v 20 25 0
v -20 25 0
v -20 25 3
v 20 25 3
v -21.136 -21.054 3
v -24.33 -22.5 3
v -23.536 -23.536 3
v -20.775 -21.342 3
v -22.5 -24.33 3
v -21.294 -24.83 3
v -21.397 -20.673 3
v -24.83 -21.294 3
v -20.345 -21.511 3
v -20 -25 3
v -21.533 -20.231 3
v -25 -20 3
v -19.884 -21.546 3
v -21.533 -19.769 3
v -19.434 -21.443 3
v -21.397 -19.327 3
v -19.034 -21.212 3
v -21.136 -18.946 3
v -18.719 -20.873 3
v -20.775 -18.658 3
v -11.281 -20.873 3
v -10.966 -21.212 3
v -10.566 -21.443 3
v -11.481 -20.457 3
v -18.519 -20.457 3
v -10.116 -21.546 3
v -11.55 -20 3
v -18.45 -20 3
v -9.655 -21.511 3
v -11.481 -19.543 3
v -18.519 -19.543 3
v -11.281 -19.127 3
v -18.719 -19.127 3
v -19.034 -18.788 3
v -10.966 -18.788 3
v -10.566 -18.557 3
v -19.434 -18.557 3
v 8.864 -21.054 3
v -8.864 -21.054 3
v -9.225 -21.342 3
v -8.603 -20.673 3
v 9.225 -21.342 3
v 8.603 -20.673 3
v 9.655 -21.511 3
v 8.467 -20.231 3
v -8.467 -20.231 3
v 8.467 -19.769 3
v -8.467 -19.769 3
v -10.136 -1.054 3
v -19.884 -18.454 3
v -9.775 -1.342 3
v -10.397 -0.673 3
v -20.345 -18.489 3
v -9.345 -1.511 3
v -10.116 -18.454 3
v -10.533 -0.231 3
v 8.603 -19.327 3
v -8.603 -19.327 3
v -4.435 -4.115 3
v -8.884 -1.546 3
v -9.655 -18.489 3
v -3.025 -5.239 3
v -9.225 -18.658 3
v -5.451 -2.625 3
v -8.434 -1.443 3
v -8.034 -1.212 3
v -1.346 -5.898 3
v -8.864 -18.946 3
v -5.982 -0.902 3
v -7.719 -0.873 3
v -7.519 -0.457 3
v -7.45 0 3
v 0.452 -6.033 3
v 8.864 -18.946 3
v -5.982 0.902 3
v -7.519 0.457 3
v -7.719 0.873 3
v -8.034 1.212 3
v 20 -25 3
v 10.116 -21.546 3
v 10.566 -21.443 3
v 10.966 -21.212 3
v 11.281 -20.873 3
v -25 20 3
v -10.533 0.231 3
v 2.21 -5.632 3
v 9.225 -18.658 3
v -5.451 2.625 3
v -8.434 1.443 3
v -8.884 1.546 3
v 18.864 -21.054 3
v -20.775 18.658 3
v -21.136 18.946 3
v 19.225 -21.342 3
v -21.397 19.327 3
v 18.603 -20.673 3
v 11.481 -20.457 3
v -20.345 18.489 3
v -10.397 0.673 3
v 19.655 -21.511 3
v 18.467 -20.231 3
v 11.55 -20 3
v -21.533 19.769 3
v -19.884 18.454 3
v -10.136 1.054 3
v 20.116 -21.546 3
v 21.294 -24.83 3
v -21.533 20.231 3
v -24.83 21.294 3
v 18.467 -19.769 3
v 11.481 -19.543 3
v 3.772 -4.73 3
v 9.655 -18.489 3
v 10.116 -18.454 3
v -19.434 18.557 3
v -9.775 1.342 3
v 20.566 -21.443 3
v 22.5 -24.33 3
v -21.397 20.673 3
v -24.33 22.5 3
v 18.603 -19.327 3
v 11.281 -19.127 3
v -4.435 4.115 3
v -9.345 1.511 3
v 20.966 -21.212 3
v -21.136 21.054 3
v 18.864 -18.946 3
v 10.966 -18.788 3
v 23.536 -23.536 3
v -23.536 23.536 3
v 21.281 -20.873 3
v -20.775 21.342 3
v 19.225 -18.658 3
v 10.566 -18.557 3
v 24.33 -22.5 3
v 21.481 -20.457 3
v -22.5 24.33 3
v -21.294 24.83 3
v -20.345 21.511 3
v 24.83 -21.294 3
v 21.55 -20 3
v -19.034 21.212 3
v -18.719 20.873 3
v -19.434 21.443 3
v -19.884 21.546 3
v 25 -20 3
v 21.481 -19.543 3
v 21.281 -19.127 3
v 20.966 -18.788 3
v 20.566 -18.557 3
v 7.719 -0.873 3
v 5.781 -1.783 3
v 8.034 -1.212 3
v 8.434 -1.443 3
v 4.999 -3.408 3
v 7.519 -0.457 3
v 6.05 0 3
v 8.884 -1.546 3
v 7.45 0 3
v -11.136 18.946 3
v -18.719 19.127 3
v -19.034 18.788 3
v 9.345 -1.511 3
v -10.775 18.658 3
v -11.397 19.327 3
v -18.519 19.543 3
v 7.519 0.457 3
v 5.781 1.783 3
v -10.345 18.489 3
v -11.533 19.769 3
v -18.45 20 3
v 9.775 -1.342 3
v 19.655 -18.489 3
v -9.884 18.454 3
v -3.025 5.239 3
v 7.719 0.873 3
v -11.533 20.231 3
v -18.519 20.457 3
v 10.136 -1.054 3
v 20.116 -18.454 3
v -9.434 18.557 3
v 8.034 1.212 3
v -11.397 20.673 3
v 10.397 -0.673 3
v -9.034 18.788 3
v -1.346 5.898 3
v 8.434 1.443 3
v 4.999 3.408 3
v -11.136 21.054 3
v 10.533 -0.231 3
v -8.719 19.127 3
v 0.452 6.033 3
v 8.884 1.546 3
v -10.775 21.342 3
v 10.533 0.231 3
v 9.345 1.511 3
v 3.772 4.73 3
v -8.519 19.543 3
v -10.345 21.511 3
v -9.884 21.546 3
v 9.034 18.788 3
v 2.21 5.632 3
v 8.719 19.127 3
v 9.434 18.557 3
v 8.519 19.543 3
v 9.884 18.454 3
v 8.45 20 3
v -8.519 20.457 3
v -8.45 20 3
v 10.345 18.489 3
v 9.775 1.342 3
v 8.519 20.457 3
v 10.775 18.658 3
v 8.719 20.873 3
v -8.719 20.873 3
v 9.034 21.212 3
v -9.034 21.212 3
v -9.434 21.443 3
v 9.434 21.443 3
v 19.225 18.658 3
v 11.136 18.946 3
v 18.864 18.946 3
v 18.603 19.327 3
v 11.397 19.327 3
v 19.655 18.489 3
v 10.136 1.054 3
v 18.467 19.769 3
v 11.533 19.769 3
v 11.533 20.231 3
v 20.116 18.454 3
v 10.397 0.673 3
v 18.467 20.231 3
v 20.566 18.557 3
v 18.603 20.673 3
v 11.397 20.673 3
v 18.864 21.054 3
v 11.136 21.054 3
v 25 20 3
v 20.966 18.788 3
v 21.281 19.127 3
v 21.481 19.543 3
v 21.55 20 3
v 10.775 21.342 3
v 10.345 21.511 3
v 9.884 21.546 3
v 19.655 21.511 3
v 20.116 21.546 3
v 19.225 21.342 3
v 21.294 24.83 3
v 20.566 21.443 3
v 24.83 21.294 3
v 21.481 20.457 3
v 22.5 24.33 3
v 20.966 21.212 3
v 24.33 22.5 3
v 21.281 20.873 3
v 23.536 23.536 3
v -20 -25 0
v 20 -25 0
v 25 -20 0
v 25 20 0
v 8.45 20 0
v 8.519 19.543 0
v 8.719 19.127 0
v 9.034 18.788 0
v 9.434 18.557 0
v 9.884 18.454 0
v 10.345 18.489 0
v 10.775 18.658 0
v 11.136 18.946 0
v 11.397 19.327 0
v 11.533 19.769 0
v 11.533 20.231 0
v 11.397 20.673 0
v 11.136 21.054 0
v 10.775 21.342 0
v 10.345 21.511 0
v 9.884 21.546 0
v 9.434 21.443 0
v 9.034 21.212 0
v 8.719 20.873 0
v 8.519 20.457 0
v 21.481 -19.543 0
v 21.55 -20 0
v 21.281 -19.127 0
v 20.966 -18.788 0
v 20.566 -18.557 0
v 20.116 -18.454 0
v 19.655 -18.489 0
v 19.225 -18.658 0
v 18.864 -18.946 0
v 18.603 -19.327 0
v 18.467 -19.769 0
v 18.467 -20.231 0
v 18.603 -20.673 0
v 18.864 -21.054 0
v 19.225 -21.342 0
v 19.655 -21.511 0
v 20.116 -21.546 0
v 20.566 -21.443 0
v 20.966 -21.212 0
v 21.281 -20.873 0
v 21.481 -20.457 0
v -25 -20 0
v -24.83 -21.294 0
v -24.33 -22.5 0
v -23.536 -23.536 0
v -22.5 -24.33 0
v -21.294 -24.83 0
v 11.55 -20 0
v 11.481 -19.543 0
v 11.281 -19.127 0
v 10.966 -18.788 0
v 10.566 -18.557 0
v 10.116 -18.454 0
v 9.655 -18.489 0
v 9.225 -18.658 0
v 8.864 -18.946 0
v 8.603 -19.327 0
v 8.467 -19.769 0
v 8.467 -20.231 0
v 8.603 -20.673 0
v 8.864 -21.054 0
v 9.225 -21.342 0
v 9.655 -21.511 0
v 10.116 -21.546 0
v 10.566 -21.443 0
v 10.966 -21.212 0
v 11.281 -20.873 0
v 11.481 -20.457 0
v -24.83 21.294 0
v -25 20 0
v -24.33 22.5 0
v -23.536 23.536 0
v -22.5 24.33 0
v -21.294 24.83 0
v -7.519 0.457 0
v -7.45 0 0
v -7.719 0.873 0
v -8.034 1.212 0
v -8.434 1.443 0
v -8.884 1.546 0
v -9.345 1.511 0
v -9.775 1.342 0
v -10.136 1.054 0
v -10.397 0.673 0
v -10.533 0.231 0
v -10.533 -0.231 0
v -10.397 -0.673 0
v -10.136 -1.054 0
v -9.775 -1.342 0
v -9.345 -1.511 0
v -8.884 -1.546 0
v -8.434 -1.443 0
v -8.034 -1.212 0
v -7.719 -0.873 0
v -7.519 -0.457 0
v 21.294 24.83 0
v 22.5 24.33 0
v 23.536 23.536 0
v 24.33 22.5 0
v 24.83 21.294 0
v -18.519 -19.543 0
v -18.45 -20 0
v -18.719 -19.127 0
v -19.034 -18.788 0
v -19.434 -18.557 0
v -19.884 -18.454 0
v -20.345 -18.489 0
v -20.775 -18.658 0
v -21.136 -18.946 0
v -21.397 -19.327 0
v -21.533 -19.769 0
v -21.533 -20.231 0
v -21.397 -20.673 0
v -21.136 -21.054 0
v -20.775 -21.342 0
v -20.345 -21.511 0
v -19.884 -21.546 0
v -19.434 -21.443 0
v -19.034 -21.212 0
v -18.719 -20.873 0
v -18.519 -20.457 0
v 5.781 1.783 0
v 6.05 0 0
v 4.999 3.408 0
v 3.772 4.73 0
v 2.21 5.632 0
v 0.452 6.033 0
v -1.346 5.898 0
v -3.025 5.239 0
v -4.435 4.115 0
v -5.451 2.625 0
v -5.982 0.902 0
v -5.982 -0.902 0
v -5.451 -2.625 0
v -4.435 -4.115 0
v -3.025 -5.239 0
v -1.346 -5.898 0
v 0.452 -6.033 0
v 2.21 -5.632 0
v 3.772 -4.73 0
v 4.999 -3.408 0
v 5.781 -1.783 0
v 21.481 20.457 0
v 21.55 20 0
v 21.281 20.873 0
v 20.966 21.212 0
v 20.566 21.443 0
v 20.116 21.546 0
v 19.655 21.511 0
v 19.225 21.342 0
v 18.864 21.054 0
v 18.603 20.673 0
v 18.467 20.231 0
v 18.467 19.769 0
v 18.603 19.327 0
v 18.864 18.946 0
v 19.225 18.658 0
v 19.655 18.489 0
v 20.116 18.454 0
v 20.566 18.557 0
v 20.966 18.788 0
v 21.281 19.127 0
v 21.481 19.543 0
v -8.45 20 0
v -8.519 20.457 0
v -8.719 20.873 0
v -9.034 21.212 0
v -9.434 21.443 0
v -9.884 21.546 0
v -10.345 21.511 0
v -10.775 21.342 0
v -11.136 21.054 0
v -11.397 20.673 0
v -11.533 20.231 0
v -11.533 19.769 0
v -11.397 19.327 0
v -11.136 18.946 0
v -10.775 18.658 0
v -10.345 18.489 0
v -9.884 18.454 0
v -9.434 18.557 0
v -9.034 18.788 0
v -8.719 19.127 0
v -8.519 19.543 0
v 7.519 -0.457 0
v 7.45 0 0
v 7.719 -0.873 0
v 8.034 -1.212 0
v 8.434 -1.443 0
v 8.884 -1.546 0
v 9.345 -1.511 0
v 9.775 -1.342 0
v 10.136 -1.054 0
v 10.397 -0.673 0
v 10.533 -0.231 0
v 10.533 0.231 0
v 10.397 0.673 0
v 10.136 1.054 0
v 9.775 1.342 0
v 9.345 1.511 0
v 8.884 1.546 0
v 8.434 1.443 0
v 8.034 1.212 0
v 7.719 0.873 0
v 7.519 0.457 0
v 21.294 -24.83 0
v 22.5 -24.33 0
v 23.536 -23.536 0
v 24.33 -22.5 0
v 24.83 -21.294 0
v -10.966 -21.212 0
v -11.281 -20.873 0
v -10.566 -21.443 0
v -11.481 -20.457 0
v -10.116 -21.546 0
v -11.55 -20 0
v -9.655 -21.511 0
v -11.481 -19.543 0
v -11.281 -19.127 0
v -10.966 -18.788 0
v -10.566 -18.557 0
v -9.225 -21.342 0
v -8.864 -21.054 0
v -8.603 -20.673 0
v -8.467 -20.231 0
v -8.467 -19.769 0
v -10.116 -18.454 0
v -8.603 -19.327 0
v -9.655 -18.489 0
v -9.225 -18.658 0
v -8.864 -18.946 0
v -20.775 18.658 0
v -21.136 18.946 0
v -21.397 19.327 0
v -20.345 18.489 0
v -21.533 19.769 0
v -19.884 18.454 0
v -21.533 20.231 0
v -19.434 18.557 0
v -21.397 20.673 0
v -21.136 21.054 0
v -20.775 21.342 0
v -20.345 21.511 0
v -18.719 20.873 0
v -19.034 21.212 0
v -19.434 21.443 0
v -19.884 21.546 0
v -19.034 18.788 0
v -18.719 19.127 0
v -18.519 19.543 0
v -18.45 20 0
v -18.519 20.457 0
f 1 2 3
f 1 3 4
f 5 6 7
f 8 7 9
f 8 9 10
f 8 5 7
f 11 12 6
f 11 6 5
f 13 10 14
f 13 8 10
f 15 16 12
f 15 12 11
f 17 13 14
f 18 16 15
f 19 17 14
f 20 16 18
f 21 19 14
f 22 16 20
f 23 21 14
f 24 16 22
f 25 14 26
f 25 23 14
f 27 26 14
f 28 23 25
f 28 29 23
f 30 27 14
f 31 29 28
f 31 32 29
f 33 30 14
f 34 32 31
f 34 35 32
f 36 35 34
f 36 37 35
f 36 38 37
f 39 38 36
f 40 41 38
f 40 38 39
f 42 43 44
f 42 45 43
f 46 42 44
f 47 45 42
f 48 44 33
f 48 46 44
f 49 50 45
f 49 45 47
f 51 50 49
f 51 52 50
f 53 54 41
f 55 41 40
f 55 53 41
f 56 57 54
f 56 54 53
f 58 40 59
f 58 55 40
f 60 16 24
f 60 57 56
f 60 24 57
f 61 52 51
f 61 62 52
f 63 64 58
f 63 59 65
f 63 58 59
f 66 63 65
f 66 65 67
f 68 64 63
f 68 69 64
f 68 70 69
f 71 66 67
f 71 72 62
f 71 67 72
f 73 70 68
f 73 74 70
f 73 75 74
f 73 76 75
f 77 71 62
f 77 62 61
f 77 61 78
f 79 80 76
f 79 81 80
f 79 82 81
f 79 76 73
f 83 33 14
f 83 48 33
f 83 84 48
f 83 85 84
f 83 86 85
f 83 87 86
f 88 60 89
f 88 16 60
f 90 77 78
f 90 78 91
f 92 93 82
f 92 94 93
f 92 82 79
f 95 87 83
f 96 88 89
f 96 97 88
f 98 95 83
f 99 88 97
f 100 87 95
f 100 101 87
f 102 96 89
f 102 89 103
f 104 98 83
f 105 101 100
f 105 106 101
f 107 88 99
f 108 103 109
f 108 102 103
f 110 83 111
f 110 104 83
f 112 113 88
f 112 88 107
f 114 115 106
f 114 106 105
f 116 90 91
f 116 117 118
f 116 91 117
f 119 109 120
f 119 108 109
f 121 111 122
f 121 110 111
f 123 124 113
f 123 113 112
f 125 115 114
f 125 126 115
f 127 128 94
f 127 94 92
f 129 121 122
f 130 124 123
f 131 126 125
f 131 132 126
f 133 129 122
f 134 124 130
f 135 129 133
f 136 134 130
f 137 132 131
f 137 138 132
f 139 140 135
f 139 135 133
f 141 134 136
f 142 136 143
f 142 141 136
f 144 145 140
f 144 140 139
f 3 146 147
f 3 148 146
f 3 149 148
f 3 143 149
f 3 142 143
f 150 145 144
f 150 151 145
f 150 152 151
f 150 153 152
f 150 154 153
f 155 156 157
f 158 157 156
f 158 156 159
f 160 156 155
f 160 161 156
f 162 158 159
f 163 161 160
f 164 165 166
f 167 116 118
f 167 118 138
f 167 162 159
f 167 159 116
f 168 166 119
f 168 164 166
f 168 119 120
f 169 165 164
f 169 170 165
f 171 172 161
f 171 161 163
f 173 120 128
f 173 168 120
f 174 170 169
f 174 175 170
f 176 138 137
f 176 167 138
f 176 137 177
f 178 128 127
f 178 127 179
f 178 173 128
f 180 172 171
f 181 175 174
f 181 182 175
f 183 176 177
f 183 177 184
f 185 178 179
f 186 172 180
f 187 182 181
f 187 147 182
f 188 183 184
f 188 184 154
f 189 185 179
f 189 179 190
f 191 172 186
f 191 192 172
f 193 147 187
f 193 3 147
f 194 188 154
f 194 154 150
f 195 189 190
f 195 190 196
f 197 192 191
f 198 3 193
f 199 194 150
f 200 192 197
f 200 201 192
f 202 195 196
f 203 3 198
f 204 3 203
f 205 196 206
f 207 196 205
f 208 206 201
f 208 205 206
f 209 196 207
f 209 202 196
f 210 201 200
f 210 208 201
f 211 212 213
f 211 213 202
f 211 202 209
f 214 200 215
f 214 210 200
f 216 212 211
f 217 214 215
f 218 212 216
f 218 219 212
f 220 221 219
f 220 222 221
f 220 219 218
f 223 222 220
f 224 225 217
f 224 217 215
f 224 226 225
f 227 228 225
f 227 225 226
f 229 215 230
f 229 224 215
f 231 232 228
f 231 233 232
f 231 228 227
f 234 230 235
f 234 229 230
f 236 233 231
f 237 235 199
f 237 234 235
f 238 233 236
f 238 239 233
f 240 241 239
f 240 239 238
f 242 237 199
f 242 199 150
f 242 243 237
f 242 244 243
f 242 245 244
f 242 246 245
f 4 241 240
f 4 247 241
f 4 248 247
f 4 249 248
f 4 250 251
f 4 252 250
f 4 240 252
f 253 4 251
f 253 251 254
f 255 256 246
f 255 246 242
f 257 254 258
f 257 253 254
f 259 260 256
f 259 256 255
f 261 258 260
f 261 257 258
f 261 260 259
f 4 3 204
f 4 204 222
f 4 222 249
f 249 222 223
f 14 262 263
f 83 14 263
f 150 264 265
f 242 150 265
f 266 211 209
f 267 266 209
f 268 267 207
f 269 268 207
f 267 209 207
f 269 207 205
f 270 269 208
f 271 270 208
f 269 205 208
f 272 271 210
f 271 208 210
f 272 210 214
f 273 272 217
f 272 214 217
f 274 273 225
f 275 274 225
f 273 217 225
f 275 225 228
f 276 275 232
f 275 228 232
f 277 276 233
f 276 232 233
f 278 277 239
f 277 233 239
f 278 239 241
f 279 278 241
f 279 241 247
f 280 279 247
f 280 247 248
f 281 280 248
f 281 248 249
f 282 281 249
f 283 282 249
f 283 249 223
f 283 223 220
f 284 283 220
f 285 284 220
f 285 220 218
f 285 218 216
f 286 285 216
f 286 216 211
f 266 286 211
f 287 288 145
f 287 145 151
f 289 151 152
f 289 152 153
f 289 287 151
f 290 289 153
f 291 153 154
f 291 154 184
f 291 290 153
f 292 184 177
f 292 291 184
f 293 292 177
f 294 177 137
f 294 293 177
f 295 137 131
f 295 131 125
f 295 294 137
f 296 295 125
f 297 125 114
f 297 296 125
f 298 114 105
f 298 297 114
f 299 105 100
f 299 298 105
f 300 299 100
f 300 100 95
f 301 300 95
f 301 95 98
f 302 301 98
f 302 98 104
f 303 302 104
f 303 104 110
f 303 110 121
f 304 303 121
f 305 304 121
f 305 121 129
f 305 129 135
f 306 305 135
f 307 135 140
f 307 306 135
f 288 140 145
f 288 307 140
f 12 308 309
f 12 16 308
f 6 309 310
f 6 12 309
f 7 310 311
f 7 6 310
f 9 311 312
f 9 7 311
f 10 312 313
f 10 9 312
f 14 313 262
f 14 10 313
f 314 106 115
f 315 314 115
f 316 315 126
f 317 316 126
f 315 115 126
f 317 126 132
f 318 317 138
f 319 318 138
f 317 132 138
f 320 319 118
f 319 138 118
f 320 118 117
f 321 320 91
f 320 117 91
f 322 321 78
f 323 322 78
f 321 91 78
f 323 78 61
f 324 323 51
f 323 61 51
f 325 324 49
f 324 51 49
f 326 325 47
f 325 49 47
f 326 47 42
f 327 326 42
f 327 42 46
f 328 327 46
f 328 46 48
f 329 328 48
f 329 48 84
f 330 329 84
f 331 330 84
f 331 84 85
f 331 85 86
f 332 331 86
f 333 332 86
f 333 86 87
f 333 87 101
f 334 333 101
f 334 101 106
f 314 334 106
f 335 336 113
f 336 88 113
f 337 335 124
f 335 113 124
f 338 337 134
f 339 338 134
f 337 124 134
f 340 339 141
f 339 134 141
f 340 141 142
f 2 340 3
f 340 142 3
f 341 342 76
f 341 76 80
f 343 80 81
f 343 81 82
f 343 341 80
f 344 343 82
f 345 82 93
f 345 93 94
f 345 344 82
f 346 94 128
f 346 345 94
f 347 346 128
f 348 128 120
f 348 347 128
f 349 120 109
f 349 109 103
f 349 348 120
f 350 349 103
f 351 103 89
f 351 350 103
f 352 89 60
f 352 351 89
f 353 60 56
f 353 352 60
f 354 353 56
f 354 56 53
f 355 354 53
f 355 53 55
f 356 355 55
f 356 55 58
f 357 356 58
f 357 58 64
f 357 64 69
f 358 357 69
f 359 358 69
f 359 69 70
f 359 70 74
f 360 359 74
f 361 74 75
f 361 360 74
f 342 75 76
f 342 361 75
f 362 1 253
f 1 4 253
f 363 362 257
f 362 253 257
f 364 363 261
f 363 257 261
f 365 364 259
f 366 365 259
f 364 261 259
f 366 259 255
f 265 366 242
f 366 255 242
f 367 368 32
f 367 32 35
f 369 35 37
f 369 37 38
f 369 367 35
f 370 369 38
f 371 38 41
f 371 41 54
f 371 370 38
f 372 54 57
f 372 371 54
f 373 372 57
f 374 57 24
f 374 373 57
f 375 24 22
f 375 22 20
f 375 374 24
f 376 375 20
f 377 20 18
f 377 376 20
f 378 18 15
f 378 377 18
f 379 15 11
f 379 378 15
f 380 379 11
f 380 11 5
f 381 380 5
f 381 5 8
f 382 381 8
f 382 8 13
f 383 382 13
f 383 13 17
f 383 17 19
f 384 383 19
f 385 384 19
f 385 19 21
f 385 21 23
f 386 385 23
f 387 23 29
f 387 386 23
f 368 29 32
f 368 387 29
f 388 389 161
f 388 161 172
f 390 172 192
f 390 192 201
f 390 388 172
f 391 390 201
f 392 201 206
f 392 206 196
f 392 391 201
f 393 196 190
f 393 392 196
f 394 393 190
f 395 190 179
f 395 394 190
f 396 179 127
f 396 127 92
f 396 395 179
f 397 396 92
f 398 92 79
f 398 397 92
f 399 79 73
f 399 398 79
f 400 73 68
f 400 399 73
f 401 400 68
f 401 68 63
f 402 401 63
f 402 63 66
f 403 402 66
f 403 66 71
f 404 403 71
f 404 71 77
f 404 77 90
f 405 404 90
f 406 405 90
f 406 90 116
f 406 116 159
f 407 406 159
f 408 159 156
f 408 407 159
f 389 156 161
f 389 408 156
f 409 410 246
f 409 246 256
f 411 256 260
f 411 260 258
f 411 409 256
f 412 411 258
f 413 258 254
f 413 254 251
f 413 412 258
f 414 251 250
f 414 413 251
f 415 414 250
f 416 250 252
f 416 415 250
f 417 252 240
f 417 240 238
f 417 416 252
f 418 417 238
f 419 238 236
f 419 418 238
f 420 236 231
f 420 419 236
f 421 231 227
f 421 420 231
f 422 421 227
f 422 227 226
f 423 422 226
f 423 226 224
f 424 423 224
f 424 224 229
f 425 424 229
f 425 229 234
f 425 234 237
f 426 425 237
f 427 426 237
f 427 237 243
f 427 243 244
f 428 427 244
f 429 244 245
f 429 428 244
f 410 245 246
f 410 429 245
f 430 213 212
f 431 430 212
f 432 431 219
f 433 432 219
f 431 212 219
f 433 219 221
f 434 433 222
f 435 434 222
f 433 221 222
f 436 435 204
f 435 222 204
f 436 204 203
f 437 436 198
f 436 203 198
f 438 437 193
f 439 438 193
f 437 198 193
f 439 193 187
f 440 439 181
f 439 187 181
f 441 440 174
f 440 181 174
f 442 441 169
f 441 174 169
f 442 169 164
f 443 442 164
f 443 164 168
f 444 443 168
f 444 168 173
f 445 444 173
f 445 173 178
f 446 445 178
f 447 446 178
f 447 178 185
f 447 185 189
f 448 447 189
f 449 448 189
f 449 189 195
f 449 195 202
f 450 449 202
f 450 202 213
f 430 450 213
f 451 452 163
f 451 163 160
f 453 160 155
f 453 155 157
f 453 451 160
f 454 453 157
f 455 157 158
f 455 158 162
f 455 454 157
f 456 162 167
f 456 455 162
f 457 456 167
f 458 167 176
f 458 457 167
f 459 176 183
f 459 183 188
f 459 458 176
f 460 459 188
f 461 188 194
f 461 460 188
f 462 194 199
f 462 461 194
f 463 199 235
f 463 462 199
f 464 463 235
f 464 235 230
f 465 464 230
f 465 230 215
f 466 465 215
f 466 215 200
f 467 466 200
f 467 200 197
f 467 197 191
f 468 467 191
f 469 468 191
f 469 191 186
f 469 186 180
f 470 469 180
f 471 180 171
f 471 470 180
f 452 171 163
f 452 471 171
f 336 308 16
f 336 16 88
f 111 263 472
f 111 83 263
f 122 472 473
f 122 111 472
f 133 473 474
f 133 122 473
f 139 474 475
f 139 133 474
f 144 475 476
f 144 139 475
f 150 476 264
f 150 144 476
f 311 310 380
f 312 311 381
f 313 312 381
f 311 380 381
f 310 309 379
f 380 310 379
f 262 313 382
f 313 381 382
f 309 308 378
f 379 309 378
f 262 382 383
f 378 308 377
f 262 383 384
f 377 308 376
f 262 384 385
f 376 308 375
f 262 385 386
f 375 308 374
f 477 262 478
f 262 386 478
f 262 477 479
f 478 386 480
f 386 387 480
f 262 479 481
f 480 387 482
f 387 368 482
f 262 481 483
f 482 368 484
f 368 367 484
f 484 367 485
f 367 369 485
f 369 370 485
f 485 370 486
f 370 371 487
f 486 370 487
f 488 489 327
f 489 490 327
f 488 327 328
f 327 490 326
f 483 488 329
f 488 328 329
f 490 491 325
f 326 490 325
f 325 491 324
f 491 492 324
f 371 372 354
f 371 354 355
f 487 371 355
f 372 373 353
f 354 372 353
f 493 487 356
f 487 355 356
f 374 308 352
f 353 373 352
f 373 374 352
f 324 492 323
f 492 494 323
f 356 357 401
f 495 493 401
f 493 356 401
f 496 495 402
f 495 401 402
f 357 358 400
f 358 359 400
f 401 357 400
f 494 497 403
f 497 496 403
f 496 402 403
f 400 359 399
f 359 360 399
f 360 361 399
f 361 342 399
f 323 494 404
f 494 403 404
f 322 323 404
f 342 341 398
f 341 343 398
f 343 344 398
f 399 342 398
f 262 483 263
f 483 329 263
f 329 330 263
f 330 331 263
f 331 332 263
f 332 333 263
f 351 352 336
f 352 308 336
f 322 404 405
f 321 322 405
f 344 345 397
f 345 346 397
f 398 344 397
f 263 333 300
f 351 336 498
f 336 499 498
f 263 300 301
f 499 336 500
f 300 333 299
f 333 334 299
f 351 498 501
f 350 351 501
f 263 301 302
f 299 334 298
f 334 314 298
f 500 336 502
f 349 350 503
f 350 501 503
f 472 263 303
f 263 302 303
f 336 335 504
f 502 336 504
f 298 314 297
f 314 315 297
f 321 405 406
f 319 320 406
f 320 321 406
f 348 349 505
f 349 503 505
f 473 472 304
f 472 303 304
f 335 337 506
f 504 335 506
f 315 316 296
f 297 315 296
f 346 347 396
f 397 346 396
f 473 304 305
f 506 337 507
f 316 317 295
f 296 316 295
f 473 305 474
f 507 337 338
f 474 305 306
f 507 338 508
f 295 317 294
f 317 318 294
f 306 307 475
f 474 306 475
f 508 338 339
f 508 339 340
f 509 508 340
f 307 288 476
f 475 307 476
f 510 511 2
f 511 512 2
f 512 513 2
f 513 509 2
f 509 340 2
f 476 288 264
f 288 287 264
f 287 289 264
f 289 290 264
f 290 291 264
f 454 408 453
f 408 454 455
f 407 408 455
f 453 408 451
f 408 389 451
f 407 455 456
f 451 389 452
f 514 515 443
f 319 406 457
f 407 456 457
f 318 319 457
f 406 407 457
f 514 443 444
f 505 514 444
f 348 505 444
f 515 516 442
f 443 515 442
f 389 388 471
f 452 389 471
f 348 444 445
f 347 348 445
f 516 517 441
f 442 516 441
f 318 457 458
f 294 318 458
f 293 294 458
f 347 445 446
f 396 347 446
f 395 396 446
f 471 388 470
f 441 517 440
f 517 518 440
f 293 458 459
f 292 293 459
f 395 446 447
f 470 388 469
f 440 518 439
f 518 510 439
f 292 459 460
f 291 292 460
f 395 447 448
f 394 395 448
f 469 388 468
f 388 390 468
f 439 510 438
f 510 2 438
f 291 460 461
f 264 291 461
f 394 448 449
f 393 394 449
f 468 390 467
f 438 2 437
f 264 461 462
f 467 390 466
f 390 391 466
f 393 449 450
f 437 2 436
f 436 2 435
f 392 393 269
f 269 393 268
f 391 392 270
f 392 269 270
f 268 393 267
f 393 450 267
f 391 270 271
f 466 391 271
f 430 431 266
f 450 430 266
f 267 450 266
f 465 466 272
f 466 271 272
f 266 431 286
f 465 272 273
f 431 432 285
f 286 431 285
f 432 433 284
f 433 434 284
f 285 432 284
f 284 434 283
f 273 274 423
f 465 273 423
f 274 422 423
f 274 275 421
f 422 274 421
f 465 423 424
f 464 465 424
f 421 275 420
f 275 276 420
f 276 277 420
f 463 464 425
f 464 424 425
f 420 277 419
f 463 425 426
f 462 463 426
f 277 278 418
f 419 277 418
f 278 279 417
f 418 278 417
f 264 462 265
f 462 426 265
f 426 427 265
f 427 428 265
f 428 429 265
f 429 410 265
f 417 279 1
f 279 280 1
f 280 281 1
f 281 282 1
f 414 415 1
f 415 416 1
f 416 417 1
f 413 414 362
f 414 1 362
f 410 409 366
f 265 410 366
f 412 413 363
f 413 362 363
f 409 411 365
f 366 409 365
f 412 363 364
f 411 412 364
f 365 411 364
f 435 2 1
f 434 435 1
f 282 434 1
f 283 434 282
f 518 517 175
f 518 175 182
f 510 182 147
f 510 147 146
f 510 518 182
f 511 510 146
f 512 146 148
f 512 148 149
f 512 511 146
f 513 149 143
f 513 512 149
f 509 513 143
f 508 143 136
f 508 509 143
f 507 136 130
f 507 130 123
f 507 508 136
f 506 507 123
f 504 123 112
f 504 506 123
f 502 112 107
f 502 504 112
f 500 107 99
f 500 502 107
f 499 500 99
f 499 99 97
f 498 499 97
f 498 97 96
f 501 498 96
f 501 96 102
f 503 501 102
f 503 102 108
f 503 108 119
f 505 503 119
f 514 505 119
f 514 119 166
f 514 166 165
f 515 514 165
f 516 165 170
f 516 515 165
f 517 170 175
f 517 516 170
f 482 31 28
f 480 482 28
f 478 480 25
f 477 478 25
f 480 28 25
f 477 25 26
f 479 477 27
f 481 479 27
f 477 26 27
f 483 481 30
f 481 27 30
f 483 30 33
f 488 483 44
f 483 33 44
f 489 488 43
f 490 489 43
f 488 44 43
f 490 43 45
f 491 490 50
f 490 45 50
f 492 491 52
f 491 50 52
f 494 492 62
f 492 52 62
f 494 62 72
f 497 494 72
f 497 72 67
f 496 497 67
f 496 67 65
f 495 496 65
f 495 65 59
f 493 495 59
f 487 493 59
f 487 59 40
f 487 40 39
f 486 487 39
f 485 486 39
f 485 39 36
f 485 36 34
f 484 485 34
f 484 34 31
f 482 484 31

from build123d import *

# Parameters (mm, degrees)
SKETCH_1_W          = 50
SKETCH_1_H          = 50
SKETCH_1_R          = 1.55
SKETCH_1_R_2        = 6.05
EXTRUDE_1_DEPTH     = 3
FILLET_1_R          = 5
SKETCH_2_R          = 1.55
CUT_EXTRUDE_1_DEPTH = 36.482389998


with BuildPart() as part:
    # ｽｹｯﾁ1 → ﾎﾞｽ - 押し出し1 (new body)
    with BuildSketch(Plane.XY):
        Rectangle(SKETCH_1_W, SKETCH_1_H)
        with Locations((-20, 20)):
            Circle(SKETCH_1_R, mode=Mode.SUBTRACT)
        with Locations((20, 20)):
            Circle(SKETCH_1_R, mode=Mode.SUBTRACT)
        with Locations((20, -20)):
            Circle(SKETCH_1_R, mode=Mode.SUBTRACT)
        with Locations((-20, -20)):
            Circle(SKETCH_1_R, mode=Mode.SUBTRACT)
        Circle(SKETCH_1_R_2, mode=Mode.SUBTRACT)
        with Locations((-9, 0)):
            Circle(SKETCH_1_R, mode=Mode.SUBTRACT)
        with Locations(Location((9, 0, 0), (0, 0, 180))):
            Circle(SKETCH_1_R, mode=Mode.SUBTRACT)
    extrude(amount=EXTRUDE_1_DEPTH)

    # ﾌｨﾚｯﾄ1
    fillet_1_edges = [part.edges().sort_by_distance(p)[0] for p in [
        (25, -25, 1.5),
        (-25, -25, 1.5),
        (-25, 25, 1.5),
        (25, 25, 1.5),
    ]]
    fillet(fillet_1_edges, radius=FILLET_1_R)

    # ｽｹｯﾁ2 → ｶｯﾄ - 押し出し1 (cut, through all)
    with BuildSketch(Plane.XY.offset(3)):
        with Locations((-10, 20)):
            Circle(SKETCH_2_R)
        with Locations(Location((10, 20, 0), (0, 0, 180))):
            Circle(SKETCH_2_R)
        with Locations((10, -20)):
            Circle(SKETCH_2_R)
        with Locations(Location((-10, -20, 0), (0, 0, 180))):
            Circle(SKETCH_2_R)
    extrude(amount=-CUT_EXTRUDE_1_DEPTH, mode=Mode.SUBTRACT)


solid = part.part
